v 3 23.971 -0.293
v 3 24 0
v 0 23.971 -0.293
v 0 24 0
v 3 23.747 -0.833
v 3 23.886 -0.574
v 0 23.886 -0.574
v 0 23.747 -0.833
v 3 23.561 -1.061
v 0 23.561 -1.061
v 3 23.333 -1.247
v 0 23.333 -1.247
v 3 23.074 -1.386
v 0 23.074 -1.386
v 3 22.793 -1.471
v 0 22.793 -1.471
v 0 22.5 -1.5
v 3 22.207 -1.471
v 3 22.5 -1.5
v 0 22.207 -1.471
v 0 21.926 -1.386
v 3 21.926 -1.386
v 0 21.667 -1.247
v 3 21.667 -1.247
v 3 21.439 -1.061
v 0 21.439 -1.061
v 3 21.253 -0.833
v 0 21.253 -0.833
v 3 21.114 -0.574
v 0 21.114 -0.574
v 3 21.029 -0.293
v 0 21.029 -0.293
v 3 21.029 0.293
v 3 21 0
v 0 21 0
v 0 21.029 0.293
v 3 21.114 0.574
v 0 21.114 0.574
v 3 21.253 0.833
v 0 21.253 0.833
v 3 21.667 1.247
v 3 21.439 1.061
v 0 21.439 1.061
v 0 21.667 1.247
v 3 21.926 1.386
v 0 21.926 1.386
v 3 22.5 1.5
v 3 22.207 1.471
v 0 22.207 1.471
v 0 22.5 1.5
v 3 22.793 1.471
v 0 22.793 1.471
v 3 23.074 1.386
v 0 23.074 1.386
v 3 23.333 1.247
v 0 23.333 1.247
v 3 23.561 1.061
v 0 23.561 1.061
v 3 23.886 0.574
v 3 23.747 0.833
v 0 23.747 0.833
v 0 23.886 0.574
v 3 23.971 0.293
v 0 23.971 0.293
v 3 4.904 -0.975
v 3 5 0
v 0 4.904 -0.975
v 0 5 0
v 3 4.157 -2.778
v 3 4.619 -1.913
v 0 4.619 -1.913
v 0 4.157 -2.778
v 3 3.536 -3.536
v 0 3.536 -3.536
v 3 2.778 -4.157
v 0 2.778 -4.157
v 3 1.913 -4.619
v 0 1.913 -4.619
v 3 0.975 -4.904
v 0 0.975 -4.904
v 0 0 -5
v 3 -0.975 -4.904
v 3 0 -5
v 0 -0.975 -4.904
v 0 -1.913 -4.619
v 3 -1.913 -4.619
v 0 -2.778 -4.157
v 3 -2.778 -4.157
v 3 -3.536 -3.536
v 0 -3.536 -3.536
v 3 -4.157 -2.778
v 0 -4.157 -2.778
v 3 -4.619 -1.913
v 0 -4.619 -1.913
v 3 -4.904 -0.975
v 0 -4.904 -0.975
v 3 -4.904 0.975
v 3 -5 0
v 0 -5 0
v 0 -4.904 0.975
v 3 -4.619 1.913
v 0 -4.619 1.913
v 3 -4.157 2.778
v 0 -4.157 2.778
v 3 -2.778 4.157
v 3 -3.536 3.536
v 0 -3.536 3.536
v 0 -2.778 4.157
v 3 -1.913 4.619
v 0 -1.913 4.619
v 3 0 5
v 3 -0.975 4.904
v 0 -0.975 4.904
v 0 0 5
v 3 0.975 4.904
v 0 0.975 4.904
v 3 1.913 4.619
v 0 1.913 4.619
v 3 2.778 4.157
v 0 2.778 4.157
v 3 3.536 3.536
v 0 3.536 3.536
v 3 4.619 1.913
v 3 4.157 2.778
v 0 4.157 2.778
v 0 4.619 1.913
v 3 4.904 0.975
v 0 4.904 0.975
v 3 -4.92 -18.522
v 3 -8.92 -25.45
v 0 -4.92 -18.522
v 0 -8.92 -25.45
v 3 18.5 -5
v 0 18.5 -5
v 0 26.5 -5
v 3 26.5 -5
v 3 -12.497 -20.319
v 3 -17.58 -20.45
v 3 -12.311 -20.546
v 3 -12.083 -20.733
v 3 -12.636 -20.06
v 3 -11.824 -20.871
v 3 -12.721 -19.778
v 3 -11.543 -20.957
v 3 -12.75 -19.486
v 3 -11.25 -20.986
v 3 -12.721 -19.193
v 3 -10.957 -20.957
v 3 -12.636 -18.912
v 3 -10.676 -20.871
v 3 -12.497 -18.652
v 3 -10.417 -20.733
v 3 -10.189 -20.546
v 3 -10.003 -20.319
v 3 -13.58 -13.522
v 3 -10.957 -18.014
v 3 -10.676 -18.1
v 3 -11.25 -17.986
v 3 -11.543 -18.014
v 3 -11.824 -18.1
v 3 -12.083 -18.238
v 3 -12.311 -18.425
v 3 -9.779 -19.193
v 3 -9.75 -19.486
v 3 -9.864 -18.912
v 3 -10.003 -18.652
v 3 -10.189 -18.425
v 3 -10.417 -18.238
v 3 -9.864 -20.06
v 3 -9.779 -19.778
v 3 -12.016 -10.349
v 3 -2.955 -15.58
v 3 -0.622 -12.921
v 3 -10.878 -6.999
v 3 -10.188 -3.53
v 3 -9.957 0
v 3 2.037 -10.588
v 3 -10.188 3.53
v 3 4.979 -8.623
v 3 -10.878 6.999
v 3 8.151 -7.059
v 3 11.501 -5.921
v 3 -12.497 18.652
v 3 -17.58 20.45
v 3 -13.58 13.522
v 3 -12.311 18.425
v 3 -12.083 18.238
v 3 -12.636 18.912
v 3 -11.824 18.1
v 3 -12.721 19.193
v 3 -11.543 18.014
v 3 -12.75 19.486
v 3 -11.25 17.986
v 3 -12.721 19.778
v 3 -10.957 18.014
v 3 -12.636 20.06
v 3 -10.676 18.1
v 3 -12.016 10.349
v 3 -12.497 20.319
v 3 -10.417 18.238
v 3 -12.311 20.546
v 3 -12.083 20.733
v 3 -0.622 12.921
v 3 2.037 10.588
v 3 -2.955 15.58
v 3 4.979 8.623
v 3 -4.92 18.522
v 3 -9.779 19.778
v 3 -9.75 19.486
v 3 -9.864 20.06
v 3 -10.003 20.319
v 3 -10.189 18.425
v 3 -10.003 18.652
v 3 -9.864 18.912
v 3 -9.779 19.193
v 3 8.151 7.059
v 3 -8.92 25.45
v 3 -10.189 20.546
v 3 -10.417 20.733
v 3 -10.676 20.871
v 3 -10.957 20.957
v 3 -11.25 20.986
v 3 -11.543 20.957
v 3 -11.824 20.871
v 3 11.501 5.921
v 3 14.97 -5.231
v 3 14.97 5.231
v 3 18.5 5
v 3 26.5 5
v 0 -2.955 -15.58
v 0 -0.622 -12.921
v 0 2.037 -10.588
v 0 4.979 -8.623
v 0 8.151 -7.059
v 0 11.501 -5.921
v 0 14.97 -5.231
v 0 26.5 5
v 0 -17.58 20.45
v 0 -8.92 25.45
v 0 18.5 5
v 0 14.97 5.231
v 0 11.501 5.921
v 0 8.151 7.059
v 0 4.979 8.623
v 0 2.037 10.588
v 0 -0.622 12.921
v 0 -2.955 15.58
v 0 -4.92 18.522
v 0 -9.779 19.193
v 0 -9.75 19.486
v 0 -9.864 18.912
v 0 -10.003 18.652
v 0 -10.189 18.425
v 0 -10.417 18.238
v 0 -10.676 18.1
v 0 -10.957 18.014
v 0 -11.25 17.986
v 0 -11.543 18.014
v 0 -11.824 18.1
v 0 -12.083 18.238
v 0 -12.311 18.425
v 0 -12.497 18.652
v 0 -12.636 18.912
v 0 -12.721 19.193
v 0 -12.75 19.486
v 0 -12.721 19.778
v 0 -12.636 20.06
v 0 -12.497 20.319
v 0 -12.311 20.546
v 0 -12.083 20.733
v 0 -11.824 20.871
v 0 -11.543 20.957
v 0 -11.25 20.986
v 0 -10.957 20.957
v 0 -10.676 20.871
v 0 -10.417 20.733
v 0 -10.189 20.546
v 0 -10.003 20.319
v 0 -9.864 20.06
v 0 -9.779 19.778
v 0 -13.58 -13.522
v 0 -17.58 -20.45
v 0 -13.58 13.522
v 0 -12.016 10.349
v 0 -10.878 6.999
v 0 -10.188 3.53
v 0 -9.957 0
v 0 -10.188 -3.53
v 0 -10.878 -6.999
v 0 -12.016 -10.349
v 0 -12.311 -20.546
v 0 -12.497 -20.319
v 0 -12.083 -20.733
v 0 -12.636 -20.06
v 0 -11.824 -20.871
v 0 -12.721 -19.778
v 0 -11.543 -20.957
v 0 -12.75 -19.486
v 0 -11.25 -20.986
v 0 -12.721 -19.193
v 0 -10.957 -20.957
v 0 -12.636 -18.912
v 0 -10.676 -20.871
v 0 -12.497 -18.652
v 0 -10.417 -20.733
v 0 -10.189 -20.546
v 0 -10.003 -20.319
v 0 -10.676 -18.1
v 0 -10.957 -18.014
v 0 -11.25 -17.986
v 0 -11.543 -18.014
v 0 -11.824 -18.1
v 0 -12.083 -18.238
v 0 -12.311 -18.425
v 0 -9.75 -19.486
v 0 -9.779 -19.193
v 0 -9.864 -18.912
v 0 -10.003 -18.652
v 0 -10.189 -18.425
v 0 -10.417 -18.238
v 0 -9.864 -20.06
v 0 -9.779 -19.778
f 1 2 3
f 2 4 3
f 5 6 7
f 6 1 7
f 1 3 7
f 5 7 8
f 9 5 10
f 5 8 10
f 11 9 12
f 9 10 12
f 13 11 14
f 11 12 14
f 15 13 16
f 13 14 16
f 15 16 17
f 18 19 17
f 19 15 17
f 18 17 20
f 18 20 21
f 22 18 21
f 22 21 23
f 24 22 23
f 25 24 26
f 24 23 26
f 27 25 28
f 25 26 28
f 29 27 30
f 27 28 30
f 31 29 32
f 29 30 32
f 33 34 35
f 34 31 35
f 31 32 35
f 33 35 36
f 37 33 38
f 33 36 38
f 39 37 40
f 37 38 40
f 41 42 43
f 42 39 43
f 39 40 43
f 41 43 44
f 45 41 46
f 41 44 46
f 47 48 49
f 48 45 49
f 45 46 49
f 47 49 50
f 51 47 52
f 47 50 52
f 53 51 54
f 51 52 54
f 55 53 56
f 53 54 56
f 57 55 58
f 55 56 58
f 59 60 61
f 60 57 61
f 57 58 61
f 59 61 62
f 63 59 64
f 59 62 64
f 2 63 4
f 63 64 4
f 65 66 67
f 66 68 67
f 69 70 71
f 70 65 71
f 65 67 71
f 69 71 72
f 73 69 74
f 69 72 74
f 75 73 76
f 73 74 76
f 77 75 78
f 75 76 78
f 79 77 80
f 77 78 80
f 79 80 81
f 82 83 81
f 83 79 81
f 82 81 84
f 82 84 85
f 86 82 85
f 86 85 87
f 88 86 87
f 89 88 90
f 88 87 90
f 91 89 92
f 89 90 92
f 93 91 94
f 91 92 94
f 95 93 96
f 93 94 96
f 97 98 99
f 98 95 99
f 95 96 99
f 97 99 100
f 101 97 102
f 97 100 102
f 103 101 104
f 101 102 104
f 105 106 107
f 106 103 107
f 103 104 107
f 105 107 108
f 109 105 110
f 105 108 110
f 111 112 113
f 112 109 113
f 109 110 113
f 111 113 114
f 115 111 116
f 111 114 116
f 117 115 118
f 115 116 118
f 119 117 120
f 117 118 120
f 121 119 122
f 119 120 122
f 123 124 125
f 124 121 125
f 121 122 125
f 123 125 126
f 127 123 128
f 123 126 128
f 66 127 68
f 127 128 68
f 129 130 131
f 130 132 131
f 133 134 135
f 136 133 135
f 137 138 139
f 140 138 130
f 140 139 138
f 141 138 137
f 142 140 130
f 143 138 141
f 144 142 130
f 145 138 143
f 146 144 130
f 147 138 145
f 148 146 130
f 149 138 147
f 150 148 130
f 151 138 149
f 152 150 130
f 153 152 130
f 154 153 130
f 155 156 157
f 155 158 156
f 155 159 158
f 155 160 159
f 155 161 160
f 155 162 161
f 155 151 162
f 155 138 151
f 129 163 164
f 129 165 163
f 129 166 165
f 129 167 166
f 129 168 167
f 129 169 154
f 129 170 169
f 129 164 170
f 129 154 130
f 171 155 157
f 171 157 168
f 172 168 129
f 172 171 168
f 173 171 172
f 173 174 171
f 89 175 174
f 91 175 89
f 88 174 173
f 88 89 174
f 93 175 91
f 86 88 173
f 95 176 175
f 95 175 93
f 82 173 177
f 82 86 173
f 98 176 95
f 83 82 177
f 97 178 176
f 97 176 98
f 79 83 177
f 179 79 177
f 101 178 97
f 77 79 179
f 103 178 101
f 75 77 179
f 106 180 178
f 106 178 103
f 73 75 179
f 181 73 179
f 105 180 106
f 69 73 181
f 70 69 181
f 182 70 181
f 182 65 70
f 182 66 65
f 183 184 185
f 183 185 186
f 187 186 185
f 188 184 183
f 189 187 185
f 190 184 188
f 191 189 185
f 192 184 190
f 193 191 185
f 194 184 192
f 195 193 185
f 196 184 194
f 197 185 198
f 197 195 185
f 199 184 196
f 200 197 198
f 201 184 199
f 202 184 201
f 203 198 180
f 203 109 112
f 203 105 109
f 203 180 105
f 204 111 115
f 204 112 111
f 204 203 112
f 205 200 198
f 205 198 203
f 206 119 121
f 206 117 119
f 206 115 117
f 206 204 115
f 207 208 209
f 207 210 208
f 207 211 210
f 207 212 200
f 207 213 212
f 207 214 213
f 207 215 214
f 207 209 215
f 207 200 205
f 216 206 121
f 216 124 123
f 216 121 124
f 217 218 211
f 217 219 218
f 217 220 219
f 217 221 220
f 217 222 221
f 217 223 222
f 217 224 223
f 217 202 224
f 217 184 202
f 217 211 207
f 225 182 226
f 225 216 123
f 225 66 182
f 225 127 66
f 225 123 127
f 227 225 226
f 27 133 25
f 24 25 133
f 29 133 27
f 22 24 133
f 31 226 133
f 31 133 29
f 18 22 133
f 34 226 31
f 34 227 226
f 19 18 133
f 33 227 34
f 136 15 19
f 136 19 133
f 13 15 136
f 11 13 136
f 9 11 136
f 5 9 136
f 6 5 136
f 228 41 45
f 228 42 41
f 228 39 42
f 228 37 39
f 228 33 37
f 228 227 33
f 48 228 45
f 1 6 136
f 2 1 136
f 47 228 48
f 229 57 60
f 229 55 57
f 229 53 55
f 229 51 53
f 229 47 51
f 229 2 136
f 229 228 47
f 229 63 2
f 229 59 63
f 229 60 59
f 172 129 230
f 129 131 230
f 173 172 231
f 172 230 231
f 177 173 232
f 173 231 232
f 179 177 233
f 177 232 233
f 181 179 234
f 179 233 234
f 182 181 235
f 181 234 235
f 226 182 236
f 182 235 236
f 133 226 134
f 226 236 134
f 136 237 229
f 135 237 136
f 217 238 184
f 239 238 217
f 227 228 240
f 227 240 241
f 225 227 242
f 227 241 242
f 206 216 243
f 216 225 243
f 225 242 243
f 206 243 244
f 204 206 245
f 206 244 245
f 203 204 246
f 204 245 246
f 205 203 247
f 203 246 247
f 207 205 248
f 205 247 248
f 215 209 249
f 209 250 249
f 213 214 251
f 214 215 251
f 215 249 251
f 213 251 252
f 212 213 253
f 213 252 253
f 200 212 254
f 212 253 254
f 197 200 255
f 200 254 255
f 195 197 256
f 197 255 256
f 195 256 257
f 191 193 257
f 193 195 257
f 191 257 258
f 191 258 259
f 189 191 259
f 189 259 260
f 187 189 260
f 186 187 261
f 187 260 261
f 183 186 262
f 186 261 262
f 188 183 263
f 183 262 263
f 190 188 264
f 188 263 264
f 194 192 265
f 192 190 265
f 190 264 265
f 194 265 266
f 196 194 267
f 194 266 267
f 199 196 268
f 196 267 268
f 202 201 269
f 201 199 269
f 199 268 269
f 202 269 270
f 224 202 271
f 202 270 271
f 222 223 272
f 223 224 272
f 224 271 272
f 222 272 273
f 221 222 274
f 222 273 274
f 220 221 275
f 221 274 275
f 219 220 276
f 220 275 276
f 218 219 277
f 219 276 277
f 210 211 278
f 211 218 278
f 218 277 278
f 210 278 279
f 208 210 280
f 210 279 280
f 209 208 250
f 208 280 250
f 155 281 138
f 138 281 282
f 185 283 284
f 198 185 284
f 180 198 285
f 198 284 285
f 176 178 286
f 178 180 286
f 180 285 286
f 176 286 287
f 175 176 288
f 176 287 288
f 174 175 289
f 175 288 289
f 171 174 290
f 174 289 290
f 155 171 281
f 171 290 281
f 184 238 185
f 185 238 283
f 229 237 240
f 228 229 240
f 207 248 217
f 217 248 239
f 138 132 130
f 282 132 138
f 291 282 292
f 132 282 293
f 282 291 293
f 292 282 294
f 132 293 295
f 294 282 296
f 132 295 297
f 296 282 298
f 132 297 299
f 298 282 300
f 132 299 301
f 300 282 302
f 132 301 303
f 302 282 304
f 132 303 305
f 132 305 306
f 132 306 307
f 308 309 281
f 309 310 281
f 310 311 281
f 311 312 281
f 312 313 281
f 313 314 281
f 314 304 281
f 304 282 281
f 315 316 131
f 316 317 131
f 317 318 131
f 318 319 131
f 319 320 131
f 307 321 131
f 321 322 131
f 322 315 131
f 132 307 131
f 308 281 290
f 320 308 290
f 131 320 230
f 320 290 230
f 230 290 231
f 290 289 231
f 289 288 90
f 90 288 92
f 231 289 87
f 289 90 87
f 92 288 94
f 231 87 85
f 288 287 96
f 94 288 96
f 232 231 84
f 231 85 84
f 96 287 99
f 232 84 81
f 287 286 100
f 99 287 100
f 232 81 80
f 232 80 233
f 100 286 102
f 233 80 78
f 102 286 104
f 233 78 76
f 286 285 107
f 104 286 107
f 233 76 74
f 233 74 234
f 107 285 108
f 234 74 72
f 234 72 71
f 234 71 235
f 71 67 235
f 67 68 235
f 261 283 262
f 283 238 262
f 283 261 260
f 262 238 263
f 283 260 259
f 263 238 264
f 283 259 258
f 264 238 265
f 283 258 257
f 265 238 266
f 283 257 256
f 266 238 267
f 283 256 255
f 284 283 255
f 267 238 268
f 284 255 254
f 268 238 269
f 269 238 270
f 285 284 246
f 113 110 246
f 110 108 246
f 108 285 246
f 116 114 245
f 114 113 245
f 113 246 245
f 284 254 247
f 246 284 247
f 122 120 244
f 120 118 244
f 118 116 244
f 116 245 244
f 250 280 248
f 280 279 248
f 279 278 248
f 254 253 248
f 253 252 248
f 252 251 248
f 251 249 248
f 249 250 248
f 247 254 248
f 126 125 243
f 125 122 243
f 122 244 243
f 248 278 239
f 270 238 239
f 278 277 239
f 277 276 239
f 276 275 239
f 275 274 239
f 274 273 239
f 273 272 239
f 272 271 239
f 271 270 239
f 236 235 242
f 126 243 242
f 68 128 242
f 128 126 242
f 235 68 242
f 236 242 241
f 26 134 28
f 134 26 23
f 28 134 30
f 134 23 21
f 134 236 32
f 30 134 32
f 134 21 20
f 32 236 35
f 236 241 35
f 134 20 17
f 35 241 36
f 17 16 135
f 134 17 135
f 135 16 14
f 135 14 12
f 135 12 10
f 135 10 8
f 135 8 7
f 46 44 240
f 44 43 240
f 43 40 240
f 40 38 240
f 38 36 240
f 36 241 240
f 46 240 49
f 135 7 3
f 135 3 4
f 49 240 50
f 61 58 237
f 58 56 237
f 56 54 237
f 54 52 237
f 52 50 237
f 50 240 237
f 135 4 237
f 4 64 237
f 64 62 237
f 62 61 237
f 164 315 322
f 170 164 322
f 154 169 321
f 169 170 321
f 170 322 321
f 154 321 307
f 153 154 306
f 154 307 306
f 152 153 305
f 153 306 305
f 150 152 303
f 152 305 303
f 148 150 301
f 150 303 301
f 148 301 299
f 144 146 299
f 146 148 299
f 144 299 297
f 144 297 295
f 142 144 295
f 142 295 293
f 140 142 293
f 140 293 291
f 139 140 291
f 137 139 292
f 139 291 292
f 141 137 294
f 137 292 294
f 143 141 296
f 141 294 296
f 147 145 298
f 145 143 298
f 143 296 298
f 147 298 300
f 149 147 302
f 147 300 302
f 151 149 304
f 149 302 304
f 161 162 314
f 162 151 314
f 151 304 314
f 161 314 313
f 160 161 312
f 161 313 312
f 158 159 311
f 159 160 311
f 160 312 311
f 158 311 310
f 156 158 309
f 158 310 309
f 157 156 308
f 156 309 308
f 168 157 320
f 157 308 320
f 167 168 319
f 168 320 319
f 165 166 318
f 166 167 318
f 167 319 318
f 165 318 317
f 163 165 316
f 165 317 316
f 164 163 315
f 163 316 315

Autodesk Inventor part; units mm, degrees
ref_plane "YZ Plane" through (0, 0, 0) normal (1, 0, 0) x (0, 1, 0)
ref_plane "XZ Plane" through (0, 0, 0) normal (0, 1, 0) x (-1, 0, 0)
ref_plane "XY Plane" through (0, 0, 0) normal (0, 0, 1) x (1, 0, 0)
sketch "草图1" plane through (0, 0, 0) normal (1, 0, 0) x (0, 1, 0)
  circle A0 centre (0, 0) radius 33.5
  circle A1 centre (33.5, 0) radius 5
  circle A2 centre (-16.75, 29.0119) radius 5
  circle A3 centre (-16.75, -29.0119) radius 5
  line L0 (33.5, 5) -> (18.5, 5)
  line L1 (18.5, 5) -> (18.5, -5)
  line L2 (18.5, -5) -> (33.5, -5)
  line L3 (33.5, -5) -> (33.5, 5)
  line L4 (-21.0801, 26.5119) -> (-13.5801, 13.5215)
  line L5 (-4.9199, 18.5215) -> (-12.4199, 31.5119)
  line L6 (-12.4199, -31.5119) -> (-4.9199, -18.5215)
  line L7 (-13.5801, -13.5215) -> (-21.0801, -26.5119)
  arc A4 (-4.9199, 18.5215) -> (18.5, 5) centre (18.5, 32.0429) ccw
  circle A5 centre (22.5, 0) radius 1.5
  line L8 (26.5, 5) -> (26.5, -5)
  arc A6 (-13.5801, -13.5215) -> (-13.5801, 13.5215) centre (-37, 0) ccw
  line L9 (-17.5801, 20.4497) -> (-8.9199, 25.4497)
  circle A7 centre (-11.25, 19.4856) radius 1.5
  arc A8 (18.5, -5) -> (-4.9199, -18.5215) centre (18.5, -32.0429) ccw
  line L10 (-8.9199, -25.4497) -> (-17.5801, -20.4497)
  circle A9 centre (-11.25, -19.4856) radius 1.5
  circle A10 centre (0, 0) radius 5
  point P0 (-4.9199, -18.5215)
  point P1 (18.5, -5)
  point P2 (-8.9199, 25.4497)
  point P3 (-13.5801, 13.5215)
  point P4 (-13.5801, -13.5215)
  point P5 (-17.5801, -20.4497)
  point P6 (-8.9199, -25.4497)
  dimension "d0" = 67
  dimension "d1" = 10
  dimension "d6" = 360
  dimension "d8" = 15
  dimension "d11" = 360
  dimension "d13" = 3
  dimension "d14" = 11
  dimension "d15" = 7
  dimension "d18" = 360
  dimension "d20" = 10
extrude "拉伸1" add sketch "草图1" along normal blind 3 contours L8 L2 L1 L0 | L5 A4 L1 A8 L6 L10 L7 A6 L4 L9
equation "\"折弯半径\" = 厚度"
equation "\"折弯释压宽度\" = 厚度"
equation "\"折弯释压深度\" = 0.5 * 厚度"
equation "\"拐角释压尺寸\" = 4 * 厚度"
equation "\"最小余量\" = 2 * 厚度"
equation "\"过渡半径\" = 折弯半径"
equation "\"Jacobi半径尺寸\" = 折弯半径"
equation "\"间隙大小\" = 厚度"
equation "\"厚度\" = 0.5"
properties part number "CAR_TRI_FRAME"
